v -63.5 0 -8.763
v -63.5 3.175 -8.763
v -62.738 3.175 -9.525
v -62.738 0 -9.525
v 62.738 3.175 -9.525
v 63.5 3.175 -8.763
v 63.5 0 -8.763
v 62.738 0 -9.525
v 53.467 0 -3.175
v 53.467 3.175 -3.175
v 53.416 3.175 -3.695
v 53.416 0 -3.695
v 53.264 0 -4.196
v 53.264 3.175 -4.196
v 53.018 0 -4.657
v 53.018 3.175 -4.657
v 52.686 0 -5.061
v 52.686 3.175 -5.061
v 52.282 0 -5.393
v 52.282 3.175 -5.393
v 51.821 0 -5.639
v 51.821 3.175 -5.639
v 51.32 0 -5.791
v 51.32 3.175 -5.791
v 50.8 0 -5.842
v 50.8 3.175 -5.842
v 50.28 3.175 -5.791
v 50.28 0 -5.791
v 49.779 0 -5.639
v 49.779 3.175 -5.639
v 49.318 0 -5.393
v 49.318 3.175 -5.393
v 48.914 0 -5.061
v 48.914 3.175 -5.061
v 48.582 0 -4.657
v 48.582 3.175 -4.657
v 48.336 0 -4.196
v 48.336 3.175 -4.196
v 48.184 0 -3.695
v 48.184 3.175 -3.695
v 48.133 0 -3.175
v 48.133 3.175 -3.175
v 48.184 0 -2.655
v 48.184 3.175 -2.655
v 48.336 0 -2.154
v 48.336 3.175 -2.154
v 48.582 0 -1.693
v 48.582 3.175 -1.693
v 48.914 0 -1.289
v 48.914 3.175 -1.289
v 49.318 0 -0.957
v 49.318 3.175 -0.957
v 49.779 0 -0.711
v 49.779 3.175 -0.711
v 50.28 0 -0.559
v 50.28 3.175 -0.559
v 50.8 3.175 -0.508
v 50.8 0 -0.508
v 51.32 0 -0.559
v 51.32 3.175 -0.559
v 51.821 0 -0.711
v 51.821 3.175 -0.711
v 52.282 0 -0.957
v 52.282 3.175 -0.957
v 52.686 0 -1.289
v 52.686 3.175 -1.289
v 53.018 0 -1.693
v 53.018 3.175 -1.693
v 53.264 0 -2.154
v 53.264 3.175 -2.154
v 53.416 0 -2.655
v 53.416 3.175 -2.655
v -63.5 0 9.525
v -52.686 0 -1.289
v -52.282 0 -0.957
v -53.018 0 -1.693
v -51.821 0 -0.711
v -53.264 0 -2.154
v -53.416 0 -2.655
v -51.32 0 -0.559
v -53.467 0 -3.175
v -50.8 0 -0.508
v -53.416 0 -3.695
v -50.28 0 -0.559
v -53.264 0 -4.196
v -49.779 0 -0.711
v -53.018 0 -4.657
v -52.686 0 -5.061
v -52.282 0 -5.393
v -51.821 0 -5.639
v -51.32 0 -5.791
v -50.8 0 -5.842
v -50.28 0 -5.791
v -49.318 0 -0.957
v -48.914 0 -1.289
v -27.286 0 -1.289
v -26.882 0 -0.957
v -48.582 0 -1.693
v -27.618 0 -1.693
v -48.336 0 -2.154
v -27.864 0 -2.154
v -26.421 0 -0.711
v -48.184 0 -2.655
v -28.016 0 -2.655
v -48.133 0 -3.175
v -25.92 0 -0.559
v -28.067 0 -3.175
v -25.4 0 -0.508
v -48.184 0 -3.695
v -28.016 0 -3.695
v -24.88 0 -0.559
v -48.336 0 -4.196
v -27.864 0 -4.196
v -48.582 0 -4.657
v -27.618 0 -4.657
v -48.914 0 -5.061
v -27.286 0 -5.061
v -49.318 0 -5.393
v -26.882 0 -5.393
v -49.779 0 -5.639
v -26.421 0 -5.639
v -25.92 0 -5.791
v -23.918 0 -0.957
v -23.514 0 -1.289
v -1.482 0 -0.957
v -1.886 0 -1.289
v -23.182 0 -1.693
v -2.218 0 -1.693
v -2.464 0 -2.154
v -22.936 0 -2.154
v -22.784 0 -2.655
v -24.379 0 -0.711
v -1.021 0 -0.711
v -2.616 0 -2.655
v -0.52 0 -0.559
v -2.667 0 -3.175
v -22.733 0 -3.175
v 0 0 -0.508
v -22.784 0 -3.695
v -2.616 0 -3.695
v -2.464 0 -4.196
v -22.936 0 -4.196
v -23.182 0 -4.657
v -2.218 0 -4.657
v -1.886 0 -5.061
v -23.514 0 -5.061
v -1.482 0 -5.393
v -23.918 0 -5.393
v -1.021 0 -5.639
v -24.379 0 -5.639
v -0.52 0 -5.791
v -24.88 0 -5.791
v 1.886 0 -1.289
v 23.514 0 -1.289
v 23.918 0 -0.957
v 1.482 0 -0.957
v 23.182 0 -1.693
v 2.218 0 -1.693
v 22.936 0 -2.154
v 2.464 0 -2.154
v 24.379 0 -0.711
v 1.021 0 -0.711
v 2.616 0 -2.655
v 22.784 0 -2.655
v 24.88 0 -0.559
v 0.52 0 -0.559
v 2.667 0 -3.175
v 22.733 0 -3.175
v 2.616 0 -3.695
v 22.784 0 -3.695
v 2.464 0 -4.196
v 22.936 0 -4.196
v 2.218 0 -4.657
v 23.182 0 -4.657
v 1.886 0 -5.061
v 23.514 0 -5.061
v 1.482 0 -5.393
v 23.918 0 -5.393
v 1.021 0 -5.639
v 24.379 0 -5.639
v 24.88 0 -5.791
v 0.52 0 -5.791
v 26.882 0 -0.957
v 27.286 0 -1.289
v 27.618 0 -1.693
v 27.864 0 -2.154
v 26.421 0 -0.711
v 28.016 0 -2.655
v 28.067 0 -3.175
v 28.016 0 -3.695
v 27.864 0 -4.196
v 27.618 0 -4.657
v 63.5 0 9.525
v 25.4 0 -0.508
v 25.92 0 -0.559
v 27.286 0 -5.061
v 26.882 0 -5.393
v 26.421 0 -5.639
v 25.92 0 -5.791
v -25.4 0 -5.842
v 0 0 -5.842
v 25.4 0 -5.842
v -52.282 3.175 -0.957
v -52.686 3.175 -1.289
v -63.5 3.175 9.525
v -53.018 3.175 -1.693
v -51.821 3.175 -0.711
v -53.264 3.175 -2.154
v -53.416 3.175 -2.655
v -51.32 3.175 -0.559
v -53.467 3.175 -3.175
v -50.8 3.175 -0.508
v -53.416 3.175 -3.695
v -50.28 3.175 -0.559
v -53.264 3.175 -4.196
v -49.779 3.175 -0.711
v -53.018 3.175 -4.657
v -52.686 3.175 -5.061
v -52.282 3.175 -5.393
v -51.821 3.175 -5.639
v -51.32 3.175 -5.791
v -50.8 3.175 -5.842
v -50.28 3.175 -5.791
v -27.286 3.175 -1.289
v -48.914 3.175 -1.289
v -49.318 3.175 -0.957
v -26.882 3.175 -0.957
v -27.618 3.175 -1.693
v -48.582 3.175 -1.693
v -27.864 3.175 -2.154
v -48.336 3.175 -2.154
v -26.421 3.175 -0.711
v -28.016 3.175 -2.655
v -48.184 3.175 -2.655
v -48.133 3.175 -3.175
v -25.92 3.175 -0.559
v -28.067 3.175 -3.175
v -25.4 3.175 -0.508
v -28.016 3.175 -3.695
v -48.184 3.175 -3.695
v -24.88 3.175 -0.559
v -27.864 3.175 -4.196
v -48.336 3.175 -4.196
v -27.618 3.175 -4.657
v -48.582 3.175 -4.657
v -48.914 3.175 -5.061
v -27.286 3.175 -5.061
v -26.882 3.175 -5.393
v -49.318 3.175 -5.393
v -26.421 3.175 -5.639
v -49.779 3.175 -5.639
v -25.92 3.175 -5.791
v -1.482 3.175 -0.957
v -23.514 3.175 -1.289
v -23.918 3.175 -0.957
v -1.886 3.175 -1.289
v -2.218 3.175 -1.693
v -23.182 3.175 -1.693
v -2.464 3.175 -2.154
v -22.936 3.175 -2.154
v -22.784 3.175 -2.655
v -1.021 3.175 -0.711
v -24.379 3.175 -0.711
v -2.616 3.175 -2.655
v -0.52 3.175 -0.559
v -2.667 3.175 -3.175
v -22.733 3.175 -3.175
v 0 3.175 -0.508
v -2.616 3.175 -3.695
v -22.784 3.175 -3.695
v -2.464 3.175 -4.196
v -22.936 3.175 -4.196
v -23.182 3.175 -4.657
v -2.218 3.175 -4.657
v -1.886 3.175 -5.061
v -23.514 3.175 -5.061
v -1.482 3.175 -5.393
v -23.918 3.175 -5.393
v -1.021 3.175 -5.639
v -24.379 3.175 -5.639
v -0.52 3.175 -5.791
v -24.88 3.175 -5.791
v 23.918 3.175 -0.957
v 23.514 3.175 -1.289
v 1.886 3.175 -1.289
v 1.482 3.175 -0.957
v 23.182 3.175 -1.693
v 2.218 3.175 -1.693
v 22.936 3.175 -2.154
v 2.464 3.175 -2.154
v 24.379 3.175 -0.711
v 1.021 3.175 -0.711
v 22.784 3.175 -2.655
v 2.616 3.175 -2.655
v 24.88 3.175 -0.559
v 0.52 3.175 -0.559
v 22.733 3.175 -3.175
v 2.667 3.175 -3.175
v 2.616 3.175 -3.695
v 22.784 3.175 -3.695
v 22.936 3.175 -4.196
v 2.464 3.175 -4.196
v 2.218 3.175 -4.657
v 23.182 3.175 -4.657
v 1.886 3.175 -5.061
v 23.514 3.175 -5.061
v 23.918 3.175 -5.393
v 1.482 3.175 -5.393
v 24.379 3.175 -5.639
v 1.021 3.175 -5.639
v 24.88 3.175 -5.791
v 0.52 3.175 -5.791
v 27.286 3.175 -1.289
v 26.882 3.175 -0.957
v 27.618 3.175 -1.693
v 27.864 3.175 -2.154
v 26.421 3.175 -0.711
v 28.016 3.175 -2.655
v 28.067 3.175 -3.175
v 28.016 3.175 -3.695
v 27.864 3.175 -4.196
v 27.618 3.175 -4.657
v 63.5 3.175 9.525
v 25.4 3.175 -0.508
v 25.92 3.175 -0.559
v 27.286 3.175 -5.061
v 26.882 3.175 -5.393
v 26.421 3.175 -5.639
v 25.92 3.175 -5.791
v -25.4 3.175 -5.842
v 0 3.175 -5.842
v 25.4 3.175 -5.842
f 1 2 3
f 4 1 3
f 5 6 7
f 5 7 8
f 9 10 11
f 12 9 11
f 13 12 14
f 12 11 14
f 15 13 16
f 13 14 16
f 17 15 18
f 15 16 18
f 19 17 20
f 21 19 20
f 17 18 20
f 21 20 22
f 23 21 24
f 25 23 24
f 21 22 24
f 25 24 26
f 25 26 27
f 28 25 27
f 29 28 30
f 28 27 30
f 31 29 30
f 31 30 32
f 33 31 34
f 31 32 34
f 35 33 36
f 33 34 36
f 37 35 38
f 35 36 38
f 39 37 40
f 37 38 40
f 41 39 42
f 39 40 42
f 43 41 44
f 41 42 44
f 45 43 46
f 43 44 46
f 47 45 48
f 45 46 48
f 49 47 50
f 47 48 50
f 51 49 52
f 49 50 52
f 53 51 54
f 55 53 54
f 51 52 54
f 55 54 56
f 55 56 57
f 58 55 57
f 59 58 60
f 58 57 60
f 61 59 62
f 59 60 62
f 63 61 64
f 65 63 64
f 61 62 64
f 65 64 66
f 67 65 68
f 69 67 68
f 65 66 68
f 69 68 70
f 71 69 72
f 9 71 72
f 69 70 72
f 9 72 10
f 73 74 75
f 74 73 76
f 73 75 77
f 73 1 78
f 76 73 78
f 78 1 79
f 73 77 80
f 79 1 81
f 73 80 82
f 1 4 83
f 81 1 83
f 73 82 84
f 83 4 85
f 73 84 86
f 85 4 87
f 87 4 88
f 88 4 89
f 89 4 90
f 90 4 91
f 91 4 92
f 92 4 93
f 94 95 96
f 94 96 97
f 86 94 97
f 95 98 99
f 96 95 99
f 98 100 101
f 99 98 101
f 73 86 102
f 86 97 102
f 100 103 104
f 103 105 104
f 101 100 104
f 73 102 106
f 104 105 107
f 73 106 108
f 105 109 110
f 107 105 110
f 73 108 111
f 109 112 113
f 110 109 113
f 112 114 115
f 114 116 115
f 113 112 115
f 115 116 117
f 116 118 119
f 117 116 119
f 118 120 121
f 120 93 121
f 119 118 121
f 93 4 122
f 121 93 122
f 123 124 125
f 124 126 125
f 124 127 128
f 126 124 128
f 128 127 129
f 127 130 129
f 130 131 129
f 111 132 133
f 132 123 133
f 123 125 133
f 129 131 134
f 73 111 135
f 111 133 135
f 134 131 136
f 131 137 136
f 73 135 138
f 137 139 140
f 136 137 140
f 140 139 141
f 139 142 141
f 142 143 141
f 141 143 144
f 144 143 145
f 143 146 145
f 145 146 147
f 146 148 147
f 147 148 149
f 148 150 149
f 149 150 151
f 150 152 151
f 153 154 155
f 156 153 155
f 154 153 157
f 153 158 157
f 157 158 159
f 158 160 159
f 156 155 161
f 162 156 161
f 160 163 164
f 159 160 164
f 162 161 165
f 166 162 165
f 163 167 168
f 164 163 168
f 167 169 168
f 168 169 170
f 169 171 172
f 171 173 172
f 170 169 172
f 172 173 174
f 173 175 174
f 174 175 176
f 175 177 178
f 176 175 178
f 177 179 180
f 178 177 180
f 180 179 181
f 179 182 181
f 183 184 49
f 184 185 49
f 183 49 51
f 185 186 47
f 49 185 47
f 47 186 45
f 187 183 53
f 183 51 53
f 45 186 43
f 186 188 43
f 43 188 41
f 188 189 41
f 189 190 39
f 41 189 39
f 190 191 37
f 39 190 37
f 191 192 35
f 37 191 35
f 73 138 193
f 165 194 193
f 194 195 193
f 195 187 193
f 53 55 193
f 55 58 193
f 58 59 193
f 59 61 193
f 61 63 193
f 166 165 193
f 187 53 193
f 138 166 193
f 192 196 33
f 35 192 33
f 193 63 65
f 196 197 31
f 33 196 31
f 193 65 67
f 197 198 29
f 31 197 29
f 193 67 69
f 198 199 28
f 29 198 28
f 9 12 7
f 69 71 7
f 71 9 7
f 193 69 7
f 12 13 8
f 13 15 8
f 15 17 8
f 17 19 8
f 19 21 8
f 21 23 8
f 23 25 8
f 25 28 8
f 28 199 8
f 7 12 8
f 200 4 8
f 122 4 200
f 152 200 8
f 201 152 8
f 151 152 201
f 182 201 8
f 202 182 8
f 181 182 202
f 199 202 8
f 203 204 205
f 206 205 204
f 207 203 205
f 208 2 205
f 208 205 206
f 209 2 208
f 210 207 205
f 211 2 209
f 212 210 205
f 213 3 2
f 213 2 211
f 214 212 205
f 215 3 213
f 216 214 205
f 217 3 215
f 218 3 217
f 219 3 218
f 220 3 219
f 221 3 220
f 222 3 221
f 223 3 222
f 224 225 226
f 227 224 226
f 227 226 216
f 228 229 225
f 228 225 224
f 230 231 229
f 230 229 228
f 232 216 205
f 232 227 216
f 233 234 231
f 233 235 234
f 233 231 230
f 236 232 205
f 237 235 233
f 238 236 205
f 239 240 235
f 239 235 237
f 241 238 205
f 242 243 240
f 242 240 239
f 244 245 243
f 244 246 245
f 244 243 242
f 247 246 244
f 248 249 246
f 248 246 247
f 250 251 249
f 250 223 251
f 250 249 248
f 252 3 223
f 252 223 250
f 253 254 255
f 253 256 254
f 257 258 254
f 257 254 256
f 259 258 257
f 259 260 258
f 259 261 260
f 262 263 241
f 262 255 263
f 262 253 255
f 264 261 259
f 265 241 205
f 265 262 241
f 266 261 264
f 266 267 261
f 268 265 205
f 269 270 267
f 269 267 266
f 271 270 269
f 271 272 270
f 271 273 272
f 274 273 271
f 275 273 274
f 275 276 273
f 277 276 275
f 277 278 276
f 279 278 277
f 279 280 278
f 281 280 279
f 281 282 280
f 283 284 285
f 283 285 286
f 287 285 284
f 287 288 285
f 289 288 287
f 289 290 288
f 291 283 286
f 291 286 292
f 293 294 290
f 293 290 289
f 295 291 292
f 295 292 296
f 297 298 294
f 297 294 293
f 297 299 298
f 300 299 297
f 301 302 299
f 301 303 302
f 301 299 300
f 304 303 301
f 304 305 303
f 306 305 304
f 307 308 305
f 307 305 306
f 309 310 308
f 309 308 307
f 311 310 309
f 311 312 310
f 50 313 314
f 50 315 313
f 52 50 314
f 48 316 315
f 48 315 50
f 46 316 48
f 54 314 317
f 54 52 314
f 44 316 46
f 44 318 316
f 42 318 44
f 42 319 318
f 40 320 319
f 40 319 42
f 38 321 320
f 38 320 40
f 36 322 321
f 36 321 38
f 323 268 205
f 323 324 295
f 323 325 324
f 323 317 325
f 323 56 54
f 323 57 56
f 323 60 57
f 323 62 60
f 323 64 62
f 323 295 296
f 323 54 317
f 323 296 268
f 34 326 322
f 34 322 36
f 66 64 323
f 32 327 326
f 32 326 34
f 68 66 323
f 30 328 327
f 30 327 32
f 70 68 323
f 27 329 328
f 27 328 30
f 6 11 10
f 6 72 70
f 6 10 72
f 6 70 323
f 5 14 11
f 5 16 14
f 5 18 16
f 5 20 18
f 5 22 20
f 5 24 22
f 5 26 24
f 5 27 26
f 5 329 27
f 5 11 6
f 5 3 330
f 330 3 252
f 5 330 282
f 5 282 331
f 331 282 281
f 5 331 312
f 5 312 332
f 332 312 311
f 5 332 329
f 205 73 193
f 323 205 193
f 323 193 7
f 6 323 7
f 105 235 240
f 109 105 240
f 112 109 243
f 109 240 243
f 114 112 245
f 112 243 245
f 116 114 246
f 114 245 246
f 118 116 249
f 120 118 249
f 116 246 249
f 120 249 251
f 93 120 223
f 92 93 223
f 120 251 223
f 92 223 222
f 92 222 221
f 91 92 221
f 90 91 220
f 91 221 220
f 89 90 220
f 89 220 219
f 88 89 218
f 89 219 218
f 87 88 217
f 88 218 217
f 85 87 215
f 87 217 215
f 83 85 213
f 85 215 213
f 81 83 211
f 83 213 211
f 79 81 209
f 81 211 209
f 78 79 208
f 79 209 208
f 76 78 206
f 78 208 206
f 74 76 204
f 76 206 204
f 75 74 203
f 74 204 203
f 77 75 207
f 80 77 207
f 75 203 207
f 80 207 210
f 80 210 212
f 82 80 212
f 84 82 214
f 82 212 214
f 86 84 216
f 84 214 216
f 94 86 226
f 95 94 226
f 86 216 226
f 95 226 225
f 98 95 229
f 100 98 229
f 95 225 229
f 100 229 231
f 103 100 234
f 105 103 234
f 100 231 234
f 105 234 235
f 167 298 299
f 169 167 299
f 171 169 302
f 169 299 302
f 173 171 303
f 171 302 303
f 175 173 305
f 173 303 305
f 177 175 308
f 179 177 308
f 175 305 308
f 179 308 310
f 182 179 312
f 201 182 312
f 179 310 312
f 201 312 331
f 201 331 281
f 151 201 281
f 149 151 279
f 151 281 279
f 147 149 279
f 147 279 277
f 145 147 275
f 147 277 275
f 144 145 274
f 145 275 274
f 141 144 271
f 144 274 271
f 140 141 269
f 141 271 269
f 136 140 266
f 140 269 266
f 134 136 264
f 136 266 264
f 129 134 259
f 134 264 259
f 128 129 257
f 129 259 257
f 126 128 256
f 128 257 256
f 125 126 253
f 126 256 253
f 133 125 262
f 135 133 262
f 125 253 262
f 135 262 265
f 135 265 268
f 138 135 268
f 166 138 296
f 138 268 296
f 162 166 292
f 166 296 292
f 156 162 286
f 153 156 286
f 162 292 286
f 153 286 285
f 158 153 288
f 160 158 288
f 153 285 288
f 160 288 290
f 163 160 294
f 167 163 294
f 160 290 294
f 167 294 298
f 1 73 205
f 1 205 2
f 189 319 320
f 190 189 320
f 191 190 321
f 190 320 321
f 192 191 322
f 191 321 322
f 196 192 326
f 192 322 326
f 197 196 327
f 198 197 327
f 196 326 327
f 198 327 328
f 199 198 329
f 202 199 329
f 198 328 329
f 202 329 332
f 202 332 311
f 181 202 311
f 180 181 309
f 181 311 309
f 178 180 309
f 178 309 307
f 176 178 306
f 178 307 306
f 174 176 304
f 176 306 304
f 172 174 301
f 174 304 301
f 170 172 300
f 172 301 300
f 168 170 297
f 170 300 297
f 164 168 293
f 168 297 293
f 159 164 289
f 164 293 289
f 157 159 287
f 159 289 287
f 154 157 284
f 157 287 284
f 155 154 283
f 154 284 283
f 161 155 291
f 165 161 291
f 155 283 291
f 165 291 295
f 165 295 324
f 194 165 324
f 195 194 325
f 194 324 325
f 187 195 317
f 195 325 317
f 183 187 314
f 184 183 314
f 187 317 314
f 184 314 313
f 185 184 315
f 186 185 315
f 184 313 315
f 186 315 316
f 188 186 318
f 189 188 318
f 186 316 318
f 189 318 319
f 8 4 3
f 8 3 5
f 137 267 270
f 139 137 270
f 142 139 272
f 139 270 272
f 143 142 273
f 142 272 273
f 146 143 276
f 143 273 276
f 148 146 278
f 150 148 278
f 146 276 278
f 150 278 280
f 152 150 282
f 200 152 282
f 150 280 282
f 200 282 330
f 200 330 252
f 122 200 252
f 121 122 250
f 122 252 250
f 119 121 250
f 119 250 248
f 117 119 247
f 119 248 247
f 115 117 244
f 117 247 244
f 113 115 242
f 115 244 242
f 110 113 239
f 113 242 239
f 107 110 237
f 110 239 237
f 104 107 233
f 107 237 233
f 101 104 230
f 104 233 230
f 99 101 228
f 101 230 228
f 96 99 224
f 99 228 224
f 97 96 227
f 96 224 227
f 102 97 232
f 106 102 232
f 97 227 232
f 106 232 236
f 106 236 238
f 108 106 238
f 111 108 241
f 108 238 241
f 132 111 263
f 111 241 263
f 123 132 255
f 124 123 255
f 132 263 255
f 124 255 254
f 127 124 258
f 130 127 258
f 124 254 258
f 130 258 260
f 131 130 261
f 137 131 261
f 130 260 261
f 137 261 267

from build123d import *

# Parameters (mm, degrees)
SKETCH1_W           = 127
SKETCH1_H           = 19.05
BOSS_EXTRUDE1_DEPTH = 3.175
SKETCH2_R           = 2.667
CUT_EXTRUDE1_DEPTH  = 3.175
CUT_EXTRUDE2_DEPTH  = 3.175


with BuildPart() as part:
    # Sketch1 → Boss-Extrude1 (new body)
    with BuildSketch(Plane(origin=(0, 0, 0), x_dir=(1, 0, 0), z_dir=(0, 1, 0))):
        Rectangle(SKETCH1_W, SKETCH1_H)
    extrude(amount=BOSS_EXTRUDE1_DEPTH)

    # Sketch2 → Cut-Extrude1 (cut)
    with BuildSketch(Plane(origin=(0, 3.175, 0), x_dir=(1, 0, 0), z_dir=(0, 1, 0))):
        with Locations((50.8, 3.175)):
            Circle(SKETCH2_R)
        with Locations((25.4, 3.175)):
            Circle(SKETCH2_R)
        with Locations((0, 3.175)):
            Circle(SKETCH2_R)
        with Locations((-25.4, 3.175)):
            Circle(SKETCH2_R)
        with Locations((-50.8, 3.175)):
            Circle(SKETCH2_R)
    extrude(amount=-CUT_EXTRUDE1_DEPTH, mode=Mode.SUBTRACT)

    # Sketch3 → Cut-Extrude2 (cut)
    with BuildSketch(Plane(origin=(0, 3.175, 0), x_dir=(1, 0, 0), z_dir=(0, 1, 0))):
        Polygon((-63.5, 9.525), (-63.5, 8.763), (-62.738, 9.525), align=None)
        Polygon((63.5, 9.525), (63.5, 8.763), (62.738, 9.525), align=None)
    extrude(amount=-CUT_EXTRUDE2_DEPTH, mode=Mode.SUBTRACT)


solid = part.part
